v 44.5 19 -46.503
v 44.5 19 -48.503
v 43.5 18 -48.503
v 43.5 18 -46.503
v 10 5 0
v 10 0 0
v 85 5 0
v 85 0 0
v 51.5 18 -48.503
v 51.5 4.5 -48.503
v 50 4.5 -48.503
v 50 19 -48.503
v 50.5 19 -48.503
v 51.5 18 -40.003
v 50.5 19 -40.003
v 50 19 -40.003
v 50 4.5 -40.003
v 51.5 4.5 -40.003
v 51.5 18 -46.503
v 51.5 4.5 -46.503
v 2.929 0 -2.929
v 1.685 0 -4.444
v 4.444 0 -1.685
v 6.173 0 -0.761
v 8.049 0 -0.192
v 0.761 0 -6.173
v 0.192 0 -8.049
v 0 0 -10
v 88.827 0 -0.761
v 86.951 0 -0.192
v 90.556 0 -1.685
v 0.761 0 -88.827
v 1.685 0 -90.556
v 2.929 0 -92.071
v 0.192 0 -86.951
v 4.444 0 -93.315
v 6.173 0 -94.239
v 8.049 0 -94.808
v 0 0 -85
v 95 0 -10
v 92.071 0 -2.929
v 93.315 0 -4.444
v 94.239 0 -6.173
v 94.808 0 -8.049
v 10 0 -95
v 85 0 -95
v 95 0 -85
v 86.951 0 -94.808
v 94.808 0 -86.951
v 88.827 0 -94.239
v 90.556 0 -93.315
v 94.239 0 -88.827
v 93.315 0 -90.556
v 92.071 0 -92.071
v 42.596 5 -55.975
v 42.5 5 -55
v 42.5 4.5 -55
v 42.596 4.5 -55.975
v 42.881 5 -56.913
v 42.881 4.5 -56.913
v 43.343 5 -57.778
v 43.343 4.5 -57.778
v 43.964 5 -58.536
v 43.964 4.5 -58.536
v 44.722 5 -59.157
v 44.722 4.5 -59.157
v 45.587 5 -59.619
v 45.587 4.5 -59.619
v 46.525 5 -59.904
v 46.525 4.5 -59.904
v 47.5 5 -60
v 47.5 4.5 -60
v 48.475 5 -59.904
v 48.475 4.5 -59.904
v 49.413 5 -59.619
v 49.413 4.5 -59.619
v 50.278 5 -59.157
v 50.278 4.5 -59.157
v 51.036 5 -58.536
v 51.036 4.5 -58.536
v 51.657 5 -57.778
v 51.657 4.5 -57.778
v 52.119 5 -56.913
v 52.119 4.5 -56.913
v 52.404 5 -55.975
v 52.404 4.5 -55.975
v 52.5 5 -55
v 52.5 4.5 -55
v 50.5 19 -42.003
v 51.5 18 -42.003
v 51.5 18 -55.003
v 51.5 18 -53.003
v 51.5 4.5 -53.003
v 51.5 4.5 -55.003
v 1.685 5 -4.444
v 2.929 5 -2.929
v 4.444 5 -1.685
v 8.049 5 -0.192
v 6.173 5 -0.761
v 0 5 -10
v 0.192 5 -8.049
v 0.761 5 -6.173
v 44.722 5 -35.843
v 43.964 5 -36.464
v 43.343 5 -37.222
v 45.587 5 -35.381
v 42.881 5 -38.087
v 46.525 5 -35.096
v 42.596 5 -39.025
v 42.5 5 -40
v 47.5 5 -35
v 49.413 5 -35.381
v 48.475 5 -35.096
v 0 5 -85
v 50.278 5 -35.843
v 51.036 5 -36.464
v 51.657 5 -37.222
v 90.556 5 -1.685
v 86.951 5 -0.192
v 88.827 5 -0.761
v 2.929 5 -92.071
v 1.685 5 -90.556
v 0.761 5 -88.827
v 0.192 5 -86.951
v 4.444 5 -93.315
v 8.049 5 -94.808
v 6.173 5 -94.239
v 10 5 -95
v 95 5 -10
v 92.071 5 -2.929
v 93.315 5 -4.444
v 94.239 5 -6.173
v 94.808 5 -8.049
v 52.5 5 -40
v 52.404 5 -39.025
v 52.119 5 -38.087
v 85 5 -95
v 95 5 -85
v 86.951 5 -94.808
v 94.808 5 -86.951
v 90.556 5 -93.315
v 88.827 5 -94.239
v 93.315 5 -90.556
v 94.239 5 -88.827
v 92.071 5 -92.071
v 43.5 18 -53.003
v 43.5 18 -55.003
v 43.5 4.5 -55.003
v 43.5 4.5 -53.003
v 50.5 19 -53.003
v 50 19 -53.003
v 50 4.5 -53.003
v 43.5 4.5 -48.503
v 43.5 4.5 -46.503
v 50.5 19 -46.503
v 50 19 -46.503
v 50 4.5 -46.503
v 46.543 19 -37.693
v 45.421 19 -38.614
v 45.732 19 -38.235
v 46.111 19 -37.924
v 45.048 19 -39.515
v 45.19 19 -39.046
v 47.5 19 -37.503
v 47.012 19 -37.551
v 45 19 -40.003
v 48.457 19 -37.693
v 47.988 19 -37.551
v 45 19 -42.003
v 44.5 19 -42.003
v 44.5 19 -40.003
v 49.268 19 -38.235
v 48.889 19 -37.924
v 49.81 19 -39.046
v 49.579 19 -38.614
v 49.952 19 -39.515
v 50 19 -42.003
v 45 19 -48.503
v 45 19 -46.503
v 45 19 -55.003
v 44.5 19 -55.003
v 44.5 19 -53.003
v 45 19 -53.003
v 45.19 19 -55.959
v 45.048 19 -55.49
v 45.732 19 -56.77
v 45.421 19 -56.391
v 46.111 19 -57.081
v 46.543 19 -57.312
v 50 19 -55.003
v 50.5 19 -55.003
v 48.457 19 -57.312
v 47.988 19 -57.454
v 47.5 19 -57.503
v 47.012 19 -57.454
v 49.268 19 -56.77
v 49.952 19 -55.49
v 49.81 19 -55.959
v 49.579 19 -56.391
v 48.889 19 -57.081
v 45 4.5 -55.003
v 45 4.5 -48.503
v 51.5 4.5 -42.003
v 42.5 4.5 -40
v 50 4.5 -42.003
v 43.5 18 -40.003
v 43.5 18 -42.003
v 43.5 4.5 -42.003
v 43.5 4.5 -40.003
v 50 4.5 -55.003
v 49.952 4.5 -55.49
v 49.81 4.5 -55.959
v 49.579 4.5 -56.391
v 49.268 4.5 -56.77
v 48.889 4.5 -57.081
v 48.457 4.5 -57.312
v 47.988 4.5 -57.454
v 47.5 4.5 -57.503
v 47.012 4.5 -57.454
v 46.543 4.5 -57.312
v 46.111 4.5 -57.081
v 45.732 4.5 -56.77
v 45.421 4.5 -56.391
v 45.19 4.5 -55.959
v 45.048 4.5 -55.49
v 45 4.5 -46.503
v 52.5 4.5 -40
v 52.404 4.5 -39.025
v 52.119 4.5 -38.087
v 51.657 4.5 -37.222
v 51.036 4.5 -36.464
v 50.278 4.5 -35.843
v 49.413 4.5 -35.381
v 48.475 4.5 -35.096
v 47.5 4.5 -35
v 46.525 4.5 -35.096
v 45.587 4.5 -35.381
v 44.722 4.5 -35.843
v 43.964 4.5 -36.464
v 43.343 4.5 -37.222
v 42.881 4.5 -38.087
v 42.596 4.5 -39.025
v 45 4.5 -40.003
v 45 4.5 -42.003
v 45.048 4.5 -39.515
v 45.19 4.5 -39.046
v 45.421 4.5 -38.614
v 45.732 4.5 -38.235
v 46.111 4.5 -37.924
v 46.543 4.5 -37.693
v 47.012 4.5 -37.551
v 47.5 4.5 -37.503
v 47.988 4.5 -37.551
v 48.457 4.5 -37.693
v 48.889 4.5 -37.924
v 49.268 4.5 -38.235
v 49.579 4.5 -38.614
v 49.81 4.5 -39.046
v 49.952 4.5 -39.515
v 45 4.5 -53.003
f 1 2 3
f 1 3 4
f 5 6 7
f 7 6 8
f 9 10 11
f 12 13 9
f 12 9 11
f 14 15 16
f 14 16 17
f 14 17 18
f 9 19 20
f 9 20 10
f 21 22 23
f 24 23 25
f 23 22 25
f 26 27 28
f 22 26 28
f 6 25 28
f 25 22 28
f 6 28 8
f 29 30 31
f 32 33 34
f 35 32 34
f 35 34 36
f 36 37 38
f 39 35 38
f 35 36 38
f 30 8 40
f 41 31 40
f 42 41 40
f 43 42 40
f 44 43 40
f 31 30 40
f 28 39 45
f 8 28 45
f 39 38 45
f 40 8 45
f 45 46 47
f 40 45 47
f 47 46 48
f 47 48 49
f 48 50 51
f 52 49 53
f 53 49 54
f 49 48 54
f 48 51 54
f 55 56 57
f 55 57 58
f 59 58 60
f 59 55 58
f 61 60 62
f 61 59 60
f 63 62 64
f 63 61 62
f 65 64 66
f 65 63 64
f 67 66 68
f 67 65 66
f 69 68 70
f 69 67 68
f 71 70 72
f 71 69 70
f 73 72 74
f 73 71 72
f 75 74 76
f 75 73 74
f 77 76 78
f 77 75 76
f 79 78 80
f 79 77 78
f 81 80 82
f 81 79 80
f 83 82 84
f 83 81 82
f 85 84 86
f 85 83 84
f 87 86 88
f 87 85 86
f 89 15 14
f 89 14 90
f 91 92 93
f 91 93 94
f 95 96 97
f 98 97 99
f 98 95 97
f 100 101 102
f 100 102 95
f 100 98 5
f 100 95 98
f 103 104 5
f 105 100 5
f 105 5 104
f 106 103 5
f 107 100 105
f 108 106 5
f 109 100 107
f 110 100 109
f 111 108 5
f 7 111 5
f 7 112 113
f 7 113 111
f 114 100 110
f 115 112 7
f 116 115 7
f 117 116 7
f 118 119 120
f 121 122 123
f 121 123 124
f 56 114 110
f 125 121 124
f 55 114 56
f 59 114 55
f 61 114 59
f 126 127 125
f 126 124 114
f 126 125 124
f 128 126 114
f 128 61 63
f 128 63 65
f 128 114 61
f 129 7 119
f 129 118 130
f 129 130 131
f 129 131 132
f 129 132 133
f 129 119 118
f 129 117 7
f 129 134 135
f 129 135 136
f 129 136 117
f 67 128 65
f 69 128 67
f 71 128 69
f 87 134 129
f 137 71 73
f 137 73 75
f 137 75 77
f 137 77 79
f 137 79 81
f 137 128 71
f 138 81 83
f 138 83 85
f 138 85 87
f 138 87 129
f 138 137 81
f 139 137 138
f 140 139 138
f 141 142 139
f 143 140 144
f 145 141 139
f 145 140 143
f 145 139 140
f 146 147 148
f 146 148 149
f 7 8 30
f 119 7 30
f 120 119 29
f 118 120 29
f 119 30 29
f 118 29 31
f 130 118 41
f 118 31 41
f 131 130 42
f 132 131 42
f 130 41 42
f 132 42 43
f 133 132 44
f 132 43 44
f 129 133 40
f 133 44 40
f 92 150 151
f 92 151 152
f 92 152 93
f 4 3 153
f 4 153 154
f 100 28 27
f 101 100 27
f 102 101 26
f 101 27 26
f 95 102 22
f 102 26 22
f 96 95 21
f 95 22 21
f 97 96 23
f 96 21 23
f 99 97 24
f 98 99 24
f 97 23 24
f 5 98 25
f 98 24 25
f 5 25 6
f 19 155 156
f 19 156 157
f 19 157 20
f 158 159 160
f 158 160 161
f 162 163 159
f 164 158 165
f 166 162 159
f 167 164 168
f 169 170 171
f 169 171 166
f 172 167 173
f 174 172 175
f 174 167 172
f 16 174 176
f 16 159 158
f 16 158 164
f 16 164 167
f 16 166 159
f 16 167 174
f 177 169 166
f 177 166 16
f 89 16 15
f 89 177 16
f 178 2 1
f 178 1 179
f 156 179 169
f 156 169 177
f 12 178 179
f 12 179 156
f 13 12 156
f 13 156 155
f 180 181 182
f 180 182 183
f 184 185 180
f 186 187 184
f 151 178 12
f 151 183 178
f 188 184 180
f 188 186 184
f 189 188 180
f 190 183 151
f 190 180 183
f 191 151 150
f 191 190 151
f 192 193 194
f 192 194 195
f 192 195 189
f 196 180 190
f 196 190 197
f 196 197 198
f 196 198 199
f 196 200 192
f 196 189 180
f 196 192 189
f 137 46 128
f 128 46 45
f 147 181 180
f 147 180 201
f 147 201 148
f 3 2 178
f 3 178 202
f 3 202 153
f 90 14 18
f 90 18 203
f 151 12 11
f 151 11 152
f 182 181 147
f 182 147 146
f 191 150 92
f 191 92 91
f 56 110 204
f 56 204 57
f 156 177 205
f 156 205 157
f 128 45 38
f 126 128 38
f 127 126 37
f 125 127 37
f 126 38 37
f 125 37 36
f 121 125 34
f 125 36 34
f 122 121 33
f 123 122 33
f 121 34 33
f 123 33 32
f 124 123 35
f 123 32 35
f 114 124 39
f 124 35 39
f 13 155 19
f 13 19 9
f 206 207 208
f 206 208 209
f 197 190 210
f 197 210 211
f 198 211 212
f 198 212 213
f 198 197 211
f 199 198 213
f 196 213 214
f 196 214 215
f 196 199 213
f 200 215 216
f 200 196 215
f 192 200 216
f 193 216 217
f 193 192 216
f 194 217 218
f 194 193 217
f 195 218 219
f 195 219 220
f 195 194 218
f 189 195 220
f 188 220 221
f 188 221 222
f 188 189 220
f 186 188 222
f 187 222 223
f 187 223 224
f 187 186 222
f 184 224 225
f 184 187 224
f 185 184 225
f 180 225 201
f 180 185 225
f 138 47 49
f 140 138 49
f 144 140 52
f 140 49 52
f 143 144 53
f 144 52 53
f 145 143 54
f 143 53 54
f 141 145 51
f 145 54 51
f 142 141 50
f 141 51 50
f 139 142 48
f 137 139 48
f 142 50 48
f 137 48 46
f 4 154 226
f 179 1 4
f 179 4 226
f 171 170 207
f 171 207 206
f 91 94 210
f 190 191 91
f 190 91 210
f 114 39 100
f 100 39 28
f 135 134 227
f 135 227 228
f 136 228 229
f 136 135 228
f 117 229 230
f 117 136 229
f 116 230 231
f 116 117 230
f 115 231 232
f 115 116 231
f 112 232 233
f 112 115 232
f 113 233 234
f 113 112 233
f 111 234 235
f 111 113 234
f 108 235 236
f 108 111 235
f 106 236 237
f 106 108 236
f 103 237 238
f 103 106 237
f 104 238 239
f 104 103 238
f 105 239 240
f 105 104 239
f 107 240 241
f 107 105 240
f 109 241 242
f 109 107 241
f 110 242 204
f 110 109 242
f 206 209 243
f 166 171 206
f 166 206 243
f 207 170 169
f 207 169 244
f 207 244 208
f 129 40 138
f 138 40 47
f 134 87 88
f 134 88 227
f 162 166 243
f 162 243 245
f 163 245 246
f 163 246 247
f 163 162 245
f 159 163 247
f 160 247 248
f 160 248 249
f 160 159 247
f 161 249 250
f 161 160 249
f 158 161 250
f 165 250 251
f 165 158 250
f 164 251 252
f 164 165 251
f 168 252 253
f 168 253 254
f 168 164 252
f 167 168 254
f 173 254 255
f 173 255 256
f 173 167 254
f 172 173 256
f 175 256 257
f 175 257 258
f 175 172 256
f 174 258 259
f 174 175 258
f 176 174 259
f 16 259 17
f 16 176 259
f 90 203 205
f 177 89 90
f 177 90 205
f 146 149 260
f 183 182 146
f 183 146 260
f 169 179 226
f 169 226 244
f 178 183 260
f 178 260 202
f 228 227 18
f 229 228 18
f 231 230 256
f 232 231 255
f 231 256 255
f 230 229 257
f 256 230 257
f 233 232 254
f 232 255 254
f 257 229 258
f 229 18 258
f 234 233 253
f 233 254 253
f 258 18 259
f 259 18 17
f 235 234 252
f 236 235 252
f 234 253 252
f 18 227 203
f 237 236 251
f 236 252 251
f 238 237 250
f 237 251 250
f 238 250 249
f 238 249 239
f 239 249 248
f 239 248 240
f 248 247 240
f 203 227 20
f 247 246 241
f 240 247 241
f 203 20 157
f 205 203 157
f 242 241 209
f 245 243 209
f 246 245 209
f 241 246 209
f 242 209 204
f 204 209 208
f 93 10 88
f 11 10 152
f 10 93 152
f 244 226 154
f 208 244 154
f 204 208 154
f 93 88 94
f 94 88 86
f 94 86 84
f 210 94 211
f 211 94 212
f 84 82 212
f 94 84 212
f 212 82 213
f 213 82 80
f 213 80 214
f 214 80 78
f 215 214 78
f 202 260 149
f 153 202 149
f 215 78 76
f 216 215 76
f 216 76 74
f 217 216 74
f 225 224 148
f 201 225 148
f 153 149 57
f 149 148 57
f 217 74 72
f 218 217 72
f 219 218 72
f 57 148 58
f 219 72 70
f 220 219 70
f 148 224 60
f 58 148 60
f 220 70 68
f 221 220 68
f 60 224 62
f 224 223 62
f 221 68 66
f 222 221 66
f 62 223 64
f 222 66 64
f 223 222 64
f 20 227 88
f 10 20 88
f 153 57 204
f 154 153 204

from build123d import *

# Parameters (mm, degrees)
BOSS_EXTRUDE1_DEPTH             = 5
CUT_EXTRUDE1_DEPTH              = 0.5
BOSS_EXTRUDE2_DEPTH             = 14
BOSS_EXTRUDE2_DIRECTION_2_REACH = 7
CHAMFER2_SIZE                   = 1


with BuildPart() as part:
    # Sketch1 → Boss-Extrude1 (new body)
    with BuildSketch(Plane(origin=(0, 0, 0), x_dir=(1, 0, 0), z_dir=(0, 1, 0))):
        with BuildLine():
            Line((10, 0), (85, 0))
            ThreePointArc((85, 0), (92.071067812, 2.928932188), (95, 10))
            Line((95, 10), (95, 85))
            ThreePointArc((95, 85), (92.071067812, 92.071067812), (85, 95))
            Line((85, 95), (10, 95))
            ThreePointArc((10, 95), (2.928932188, 92.071067812), (0, 85))
            Line((0, 85), (0, 10))
            ThreePointArc((0, 10), (2.928932188, 2.928932188), (10, 0))
        make_face()
    extrude(amount=BOSS_EXTRUDE1_DEPTH)

    # Sketch4 → Cut-Extrude1 (cut)
    with BuildSketch(Plane(origin=(0, 5, 0), x_dir=(1, 0, 0), z_dir=(0, 1, 0))):
        with BuildLine():
            Line((52.5, 55), (52.5, 40))
            ThreePointArc((52.5, 40), (47.5, 35), (42.5, 40))
            Line((42.5, 40), (42.5, 55))
            ThreePointArc((42.5, 55), (47.5, 60), (52.5, 55))
        make_face()
    extrude(amount=-CUT_EXTRUDE1_DEPTH, mode=Mode.SUBTRACT)

    # Sketch3 → Boss-Extrude2 (add)
    with BuildSketch(Plane(origin=(0, 5, 0), x_dir=(1, 0, 0), z_dir=(0, 1, 0))):
        with BuildLine():
            Line((45, 53.002509929), (45, 48.502509929))
            Line((45, 48.502509929), (43.5, 48.502509929))
            Line((43.5, 48.502509929), (43.5, 46.502509929))
            Line((43.5, 46.502509929), (45, 46.502509929))
            Line((45, 46.502509929), (45, 42.002509929))
            Line((45, 42.002509929), (43.5, 42.002509929))
            Line((43.5, 42.002509929), (43.5, 40.002509929))
            Line((43.5, 40.002509929), (45, 40.002509929))
            ThreePointArc((45, 40.002509929), (47.5, 37.502509929), (50, 40.002509929))
            Line((50, 40.002509929), (51.5, 40.002509929))
            Line((51.5, 40.002509929), (51.5, 42.002509929))
            Line((51.5, 42.002509929), (50, 42.002509929))
            Line((50, 42.002509929), (50, 46.502509929))
            Line((50, 46.502509929), (51.5, 46.502509929))
            Line((51.5, 46.502509929), (51.5, 48.502509929))
            Line((51.5, 48.502509929), (50, 48.502509929))
            Line((50, 48.502509929), (50, 53.002509929))
            Line((50, 53.002509929), (51.5, 53.002509929))
            Line((51.5, 53.002509929), (51.5, 55.002509929))
            Line((51.5, 55.002509929), (50, 55.002509929))
            ThreePointArc((50, 55.002509929), (47.5, 57.502509929), (45, 55.002509929))
            Line((45, 55.002509929), (43.5, 55.002509929))
            Line((43.5, 55.002509929), (43.5, 53.002509929))
            Line((43.5, 53.002509929), (45, 53.002509929))
        make_face()
    extrude(amount=BOSS_EXTRUDE2_DEPTH)

    # Sketch3 → Boss-Extrude2 direction 2 (add, up to next)
    with BuildSketch(Plane(origin=(0, 5, 0), x_dir=(1, 0, 0), z_dir=(0, 1, 0)), mode=Mode.PRIVATE) as boss_extrude2_direction_2_sk1:
        with BuildLine():
            Line((45, 53.002509929), (45, 48.502509929))
            Line((45, 48.502509929), (43.5, 48.502509929))
            Line((43.5, 48.502509929), (43.5, 46.502509929))
            Line((43.5, 46.502509929), (45, 46.502509929))
            Line((45, 46.502509929), (45, 42.002509929))
            Line((45, 42.002509929), (43.5, 42.002509929))
            Line((43.5, 42.002509929), (43.5, 40.002509929))
            Line((43.5, 40.002509929), (45, 40.002509929))
            ThreePointArc((45, 40.002509929), (47.5, 37.502509929), (50, 40.002509929))
            Line((50, 40.002509929), (51.5, 40.002509929))
            Line((51.5, 40.002509929), (51.5, 42.002509929))
            Line((51.5, 42.002509929), (50, 42.002509929))
            Line((50, 42.002509929), (50, 46.502509929))
            Line((50, 46.502509929), (51.5, 46.502509929))
            Line((51.5, 46.502509929), (51.5, 48.502509929))
            Line((51.5, 48.502509929), (50, 48.502509929))
            Line((50, 48.502509929), (50, 53.002509929))
            Line((50, 53.002509929), (51.5, 53.002509929))
            Line((51.5, 53.002509929), (51.5, 55.002509929))
            Line((51.5, 55.002509929), (50, 55.002509929))
            ThreePointArc((50, 55.002509929), (47.5, 57.502509929), (45, 55.002509929))
            Line((45, 55.002509929), (43.5, 55.002509929))
            Line((43.5, 55.002509929), (43.5, 53.002509929))
            Line((43.5, 53.002509929), (45, 53.002509929))
        make_face()
    boss_extrude2_direction_2_tool1 = extrude(boss_extrude2_direction_2_sk1.sketch, amount=-BOSS_EXTRUDE2_DIRECTION_2_REACH, mode=Mode.PRIVATE) - part.part
    add(boss_extrude2_direction_2_tool1.solids().sort_by_distance((47.5, 5, -47.50251))[0])

    # Chamfer2
    chamfer2_edges = [part.edges().sort_by_distance(p)[0] for p in [
        (43.5, 19, -47.502509929),
        (43.5, 19, -41.002509929),
        (51.5, 19, -41.002509929),
        (51.5, 19, -47.502509929),
        (51.5, 19, -54.002509929),
        (43.5, 19, -54.002509929),
    ]]
    chamfer(chamfer2_edges, length=CHAMFER2_SIZE)


solid = part.part
